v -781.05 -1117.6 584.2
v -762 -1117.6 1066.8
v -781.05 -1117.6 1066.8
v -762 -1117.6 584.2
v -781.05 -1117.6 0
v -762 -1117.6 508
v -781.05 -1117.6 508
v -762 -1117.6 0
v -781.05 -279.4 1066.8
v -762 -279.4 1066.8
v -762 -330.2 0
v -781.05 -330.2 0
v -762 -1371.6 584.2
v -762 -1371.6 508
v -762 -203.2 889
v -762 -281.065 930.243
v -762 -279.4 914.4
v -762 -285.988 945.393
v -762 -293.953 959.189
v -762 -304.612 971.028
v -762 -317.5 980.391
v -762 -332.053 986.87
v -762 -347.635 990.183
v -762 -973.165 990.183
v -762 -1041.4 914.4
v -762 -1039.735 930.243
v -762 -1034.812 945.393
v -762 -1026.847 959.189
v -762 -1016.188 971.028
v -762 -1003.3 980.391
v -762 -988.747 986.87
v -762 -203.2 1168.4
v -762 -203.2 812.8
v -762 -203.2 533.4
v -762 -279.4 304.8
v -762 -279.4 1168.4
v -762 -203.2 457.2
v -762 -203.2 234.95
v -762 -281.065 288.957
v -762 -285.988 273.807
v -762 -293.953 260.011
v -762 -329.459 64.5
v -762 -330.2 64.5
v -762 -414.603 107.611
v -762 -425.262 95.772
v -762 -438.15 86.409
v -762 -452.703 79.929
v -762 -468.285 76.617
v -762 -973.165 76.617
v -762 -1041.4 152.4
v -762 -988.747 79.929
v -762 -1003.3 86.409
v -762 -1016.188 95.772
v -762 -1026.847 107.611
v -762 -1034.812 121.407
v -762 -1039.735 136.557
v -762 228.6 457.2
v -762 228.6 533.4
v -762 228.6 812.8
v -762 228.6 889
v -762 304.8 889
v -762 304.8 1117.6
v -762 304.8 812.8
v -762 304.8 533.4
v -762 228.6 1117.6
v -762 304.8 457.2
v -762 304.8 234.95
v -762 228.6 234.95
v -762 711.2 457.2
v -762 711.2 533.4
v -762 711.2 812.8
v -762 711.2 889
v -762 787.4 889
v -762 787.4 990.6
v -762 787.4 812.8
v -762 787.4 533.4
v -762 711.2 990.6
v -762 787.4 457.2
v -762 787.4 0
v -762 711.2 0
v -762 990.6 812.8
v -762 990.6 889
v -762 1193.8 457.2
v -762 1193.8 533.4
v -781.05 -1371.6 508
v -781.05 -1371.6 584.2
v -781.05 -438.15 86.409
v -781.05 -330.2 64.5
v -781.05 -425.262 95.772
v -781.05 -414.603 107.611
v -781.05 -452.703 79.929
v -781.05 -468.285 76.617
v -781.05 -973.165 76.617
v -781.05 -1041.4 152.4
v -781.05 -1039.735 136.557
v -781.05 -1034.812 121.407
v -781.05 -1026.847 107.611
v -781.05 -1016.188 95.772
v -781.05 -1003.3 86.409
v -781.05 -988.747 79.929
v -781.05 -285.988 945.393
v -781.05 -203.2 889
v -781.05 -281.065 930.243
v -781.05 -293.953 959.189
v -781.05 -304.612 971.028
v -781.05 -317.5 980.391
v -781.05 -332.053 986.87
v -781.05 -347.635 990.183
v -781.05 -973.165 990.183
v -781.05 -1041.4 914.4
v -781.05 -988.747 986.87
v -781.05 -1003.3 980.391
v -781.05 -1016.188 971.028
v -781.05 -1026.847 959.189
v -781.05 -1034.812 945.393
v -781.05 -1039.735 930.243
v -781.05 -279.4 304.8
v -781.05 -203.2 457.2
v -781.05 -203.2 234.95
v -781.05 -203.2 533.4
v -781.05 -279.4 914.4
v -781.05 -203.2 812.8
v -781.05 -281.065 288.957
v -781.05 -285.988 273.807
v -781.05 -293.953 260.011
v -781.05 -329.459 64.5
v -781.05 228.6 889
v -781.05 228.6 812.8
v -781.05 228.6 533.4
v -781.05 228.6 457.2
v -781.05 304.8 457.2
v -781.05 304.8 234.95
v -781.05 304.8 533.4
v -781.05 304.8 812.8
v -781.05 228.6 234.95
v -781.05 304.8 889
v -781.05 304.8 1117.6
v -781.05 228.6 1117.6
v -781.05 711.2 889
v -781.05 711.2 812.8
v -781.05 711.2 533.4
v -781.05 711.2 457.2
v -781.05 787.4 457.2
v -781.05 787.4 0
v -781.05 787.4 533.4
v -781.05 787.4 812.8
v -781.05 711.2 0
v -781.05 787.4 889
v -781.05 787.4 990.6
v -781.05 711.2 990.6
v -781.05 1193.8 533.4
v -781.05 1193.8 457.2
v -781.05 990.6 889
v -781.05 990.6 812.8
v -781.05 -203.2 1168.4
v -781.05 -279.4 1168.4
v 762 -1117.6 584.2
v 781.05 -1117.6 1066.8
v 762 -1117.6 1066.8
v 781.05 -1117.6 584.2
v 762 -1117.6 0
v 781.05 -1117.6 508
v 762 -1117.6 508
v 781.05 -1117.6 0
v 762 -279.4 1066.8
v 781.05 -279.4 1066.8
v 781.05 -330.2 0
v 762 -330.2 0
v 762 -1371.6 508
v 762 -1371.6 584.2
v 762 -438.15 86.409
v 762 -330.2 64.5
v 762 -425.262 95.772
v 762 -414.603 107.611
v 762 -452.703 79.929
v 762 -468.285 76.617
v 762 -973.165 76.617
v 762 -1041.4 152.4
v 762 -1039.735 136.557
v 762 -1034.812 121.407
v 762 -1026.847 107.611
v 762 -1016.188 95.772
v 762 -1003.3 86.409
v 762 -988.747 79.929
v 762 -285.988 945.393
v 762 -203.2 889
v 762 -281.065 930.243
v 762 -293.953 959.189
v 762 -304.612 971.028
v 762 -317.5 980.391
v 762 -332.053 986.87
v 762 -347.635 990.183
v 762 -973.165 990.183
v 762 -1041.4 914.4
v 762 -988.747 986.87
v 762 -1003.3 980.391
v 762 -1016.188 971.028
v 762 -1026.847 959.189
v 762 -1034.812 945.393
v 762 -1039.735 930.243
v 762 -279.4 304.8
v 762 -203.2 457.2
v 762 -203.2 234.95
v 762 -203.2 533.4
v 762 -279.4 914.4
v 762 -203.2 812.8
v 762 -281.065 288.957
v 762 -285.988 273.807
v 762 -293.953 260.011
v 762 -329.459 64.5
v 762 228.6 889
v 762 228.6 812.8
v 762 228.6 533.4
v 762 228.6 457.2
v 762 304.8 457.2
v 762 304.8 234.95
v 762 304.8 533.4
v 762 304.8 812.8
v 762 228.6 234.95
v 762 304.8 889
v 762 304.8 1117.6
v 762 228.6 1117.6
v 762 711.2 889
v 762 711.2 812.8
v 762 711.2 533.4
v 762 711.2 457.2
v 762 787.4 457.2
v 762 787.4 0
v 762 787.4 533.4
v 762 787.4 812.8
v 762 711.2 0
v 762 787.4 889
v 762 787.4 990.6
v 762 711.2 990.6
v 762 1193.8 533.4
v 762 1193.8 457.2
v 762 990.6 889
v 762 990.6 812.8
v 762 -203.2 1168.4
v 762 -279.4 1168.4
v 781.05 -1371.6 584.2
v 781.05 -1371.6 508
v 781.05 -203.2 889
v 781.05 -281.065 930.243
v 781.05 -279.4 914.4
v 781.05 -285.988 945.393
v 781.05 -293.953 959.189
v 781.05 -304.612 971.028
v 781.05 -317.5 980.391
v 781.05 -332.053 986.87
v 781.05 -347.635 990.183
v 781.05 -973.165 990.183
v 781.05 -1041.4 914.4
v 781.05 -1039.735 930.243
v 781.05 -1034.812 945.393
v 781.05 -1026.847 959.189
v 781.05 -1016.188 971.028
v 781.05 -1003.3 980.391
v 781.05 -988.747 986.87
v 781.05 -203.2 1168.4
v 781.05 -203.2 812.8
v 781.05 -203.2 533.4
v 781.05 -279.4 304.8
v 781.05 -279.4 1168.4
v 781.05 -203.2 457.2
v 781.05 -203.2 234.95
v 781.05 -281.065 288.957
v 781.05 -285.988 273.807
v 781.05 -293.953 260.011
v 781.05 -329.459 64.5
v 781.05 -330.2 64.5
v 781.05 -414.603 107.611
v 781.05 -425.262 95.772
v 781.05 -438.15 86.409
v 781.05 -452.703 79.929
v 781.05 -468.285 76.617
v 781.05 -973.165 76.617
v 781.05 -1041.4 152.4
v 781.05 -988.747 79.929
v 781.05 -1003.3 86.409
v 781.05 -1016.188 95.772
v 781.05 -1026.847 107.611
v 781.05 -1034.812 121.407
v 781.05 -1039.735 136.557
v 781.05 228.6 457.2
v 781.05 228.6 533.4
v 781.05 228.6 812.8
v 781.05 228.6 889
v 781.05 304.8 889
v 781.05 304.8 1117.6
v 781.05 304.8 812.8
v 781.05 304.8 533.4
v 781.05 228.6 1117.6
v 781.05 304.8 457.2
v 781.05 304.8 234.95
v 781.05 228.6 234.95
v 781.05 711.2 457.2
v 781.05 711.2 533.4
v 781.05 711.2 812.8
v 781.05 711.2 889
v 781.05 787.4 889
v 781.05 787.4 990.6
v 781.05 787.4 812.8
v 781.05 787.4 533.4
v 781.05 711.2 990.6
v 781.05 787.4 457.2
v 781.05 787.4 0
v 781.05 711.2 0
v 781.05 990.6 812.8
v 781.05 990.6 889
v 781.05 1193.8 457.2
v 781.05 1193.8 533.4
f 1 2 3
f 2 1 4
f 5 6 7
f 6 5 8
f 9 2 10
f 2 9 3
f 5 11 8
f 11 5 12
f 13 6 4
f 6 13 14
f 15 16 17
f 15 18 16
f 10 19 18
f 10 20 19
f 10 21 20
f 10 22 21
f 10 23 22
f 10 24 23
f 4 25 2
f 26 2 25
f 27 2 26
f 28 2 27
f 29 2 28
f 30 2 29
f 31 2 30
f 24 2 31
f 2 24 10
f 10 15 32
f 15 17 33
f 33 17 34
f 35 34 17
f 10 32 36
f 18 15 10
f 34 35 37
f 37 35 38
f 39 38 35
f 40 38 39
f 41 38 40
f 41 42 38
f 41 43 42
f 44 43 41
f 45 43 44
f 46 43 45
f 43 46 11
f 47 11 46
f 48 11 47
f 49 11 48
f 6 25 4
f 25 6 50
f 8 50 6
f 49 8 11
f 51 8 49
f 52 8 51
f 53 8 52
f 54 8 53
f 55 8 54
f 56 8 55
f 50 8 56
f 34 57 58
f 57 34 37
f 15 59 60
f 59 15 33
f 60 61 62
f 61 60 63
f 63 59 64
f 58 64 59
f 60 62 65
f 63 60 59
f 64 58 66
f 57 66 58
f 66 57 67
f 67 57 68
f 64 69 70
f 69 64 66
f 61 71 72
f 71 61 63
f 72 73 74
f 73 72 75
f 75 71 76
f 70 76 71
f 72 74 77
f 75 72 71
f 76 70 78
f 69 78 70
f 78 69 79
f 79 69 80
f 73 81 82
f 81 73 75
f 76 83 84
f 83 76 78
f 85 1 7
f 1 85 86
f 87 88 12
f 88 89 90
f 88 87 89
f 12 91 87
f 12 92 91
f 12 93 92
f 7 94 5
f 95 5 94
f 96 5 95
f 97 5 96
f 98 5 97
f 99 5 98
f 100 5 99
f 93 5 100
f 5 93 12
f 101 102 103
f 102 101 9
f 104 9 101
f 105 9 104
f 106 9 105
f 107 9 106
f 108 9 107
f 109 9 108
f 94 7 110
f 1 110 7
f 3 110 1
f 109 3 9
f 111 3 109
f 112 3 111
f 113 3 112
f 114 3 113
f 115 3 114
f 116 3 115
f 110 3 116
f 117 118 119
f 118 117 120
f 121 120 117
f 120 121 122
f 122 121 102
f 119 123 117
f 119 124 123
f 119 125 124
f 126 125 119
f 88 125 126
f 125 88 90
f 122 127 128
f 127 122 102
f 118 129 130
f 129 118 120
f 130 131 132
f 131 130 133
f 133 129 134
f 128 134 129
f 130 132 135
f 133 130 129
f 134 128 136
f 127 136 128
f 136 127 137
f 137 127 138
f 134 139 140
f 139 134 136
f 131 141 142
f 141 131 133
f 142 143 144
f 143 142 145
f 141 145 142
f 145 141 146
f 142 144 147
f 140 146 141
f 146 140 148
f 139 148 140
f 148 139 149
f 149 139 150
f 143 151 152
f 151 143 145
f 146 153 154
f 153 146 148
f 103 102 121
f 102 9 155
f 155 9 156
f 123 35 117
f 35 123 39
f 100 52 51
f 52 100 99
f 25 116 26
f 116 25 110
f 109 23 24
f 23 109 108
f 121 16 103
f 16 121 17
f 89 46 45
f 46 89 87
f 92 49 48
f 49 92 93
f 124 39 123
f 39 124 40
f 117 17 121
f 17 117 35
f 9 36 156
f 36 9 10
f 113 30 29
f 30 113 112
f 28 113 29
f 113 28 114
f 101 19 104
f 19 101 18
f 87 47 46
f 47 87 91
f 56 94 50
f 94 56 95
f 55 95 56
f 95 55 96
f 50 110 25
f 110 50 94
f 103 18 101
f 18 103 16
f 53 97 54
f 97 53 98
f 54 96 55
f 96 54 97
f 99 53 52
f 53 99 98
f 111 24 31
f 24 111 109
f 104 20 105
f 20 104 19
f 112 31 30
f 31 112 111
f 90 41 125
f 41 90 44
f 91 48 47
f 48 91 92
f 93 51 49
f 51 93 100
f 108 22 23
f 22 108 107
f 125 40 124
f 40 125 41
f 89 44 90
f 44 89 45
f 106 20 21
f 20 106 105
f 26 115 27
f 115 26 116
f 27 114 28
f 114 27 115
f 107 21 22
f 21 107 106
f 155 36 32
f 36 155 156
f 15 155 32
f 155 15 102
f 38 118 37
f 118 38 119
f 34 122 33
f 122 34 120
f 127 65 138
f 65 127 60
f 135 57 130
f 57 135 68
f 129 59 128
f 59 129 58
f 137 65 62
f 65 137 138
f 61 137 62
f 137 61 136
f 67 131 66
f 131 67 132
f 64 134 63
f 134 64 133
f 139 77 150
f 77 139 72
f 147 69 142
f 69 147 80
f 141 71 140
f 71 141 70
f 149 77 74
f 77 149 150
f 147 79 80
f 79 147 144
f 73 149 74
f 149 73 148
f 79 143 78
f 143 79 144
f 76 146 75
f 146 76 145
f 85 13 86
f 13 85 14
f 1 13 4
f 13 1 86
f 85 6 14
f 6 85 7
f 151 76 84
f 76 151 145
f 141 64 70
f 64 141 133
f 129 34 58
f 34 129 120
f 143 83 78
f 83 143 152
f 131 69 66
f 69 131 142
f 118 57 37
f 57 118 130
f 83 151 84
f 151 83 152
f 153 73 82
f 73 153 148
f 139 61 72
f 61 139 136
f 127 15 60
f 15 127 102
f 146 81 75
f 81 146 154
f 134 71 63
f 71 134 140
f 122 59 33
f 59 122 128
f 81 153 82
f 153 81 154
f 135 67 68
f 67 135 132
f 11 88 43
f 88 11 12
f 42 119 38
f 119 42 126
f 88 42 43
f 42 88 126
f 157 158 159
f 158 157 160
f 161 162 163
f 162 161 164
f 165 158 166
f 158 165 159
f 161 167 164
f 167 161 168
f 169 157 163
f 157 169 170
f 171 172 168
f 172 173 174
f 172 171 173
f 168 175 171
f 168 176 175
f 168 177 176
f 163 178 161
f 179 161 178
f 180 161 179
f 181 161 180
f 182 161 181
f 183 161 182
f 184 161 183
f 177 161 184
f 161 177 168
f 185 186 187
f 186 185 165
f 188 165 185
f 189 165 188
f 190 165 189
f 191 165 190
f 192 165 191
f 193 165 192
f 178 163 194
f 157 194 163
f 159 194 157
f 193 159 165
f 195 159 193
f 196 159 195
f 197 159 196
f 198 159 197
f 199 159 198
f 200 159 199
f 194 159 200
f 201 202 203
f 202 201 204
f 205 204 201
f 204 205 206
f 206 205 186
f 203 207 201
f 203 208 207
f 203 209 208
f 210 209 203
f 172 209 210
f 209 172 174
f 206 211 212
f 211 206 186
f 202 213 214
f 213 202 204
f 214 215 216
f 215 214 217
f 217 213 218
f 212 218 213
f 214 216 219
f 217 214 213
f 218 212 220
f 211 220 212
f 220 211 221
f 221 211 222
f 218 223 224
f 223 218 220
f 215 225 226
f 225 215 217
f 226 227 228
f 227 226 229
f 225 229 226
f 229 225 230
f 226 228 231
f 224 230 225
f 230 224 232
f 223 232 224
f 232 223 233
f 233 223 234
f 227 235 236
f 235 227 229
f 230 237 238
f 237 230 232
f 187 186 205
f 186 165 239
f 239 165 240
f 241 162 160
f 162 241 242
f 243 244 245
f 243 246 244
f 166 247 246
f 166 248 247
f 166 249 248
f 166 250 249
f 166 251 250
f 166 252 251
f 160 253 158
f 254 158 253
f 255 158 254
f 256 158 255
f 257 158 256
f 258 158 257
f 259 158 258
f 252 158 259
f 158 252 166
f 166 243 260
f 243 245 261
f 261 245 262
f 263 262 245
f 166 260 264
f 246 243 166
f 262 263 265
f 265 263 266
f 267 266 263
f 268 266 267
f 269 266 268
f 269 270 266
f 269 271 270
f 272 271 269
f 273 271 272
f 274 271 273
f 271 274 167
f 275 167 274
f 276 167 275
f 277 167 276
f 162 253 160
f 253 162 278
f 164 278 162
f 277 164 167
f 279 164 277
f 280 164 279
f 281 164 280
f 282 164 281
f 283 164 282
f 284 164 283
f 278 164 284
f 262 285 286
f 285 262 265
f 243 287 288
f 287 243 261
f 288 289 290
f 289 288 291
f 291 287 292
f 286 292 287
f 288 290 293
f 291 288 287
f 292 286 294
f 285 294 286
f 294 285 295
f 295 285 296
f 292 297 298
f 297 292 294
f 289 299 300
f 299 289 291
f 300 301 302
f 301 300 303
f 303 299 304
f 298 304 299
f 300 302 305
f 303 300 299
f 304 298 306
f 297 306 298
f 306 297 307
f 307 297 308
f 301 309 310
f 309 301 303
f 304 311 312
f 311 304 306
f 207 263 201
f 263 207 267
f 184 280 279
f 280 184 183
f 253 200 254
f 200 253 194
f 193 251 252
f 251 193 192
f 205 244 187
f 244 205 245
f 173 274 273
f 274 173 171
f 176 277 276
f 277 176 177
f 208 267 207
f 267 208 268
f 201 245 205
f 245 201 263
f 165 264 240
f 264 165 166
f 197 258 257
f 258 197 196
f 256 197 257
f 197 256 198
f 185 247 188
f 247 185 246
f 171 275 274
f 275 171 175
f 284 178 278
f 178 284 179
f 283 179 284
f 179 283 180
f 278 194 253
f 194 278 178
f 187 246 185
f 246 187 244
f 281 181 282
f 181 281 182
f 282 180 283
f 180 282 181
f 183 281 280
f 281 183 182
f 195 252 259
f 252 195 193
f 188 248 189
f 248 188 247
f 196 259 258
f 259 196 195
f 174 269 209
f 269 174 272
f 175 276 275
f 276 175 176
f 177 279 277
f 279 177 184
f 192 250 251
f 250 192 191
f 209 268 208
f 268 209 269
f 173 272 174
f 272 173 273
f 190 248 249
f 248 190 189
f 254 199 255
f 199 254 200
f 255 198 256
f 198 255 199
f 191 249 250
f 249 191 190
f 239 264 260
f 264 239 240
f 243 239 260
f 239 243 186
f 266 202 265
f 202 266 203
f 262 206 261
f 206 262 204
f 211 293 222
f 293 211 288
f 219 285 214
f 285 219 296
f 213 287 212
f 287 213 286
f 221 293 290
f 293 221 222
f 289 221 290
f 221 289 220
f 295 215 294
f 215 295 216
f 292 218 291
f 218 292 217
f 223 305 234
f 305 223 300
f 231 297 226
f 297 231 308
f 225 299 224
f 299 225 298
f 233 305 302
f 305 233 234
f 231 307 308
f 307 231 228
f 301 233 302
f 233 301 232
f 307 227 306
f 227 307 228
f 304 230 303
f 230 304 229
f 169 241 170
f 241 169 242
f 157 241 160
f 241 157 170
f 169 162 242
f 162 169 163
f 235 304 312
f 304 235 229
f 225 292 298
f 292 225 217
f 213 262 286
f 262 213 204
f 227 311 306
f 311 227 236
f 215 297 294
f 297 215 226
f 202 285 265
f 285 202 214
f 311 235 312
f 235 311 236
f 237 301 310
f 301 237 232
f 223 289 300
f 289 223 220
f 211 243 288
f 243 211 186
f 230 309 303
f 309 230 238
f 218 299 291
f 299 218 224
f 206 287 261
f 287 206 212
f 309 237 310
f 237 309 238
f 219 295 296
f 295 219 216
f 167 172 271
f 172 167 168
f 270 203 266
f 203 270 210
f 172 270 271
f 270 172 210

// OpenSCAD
// file: ../constants/trailer.scad
use <../lib/convert.scad>

FRAME_WIDTH = feet(4);
FRAME_LENGTH = feet(8);
FRAME_THICKNESS = inches(3);
AXEL_OFFSET_Y = inches(6);
// file: ../components/wheel_well.scad
use <../lib/convert.scad>
use <../lib/colors.scad>

wheel_well_top_width = inches(22);
wheel_well_base_width = inches(32);
wheel_well_depth = inches(13);
wheel_well_base_thickness = inches(2.5);
wheel_well_height = inches(6) + wheel_well_base_thickness;


module wheel_well_cutout() {
  translate([0, 0, -1])
  translate([0, wheel_well_base_width / -2, 0])
  cube([wheel_well_depth + 1, wheel_well_base_width, wheel_well_base_thickness + 2]);
}

module wheel_well_shape() {
  color_wood()
  translate([0, wheel_well_base_width / -2, 0])
  hull() {
    translate([0, (wheel_well_base_width - wheel_well_top_width) / 2, wheel_well_height])
      cube([wheel_well_depth, wheel_well_top_width, inches(0.75)]);

    cube([wheel_well_depth, wheel_well_base_width, wheel_well_base_thickness]);
  }
}

module wheel_well_inside() {
  scale_y = (wheel_well_base_width - inches(1.5)) / wheel_well_base_width;
  scale_z = (wheel_well_height - inches(0.75)) / wheel_well_height;

  color_black()
  scale([1, scale_y, scale_z])
    wheel_well_shape();
}

module wheel_well() {
  difference() {
    wheel_well_shape();

    translate([inches(0.75), 0, -1])
      wheel_well_inside();
  }
}

wheel_well();
// file: ../lib/colors.scad
module color_wood() {
  color("#F8D89D")
    children();
}

module color_hdpe() {
  color("#ccd")
    children();
}

module color_steel() {
  color("#888")
    children();
}

module color_white() {
  color("#fafafa")
    children();
}

module color_black() {
  color("#333")
    children();
}

module color_outside() {
  color("#90b0c4")
    children();
}
// file: ../components/teardrop_side.scad
use <../lib/convert.scad>
use <../lib/colors.scad>
use <./wheel_well.scad>
use <./teardrop_ceiling.scad>
include <../constants/trailer.scad>

side_skin_thickness = inches(0.25);
side_frame_thickness = inches(0.75);

wheel_well_x_offset = AXEL_OFFSET_Y + feet(4) + inches(0);

door_width = inches(30);
door_height = inches(36);
door_radius = inches(3);
door_offset = inches(10);

// Fixes for dxf import
bottom_offset = inches(-0.67);
front_offset = feet(-8) + inches(-11.07);
scale_fix = 1.002;

module door_cutout() {
  thickness = inches(3);
  radius_offset = door_radius * 2;

  translate([door_radius, door_radius, -thickness / 2])
  hull() {
    // bottom left, this creates a angled corner to fit the wheelwell
    translate([0, inches(6), 0])
      cylinder(thickness, r1 = door_radius, r2 = door_radius);
    translate([inches(4.75), 0, 0])
      cylinder(thickness, r1 = door_radius, r2 = door_radius);

    // bottom right
    translate([door_width - radius_offset, 0, 0])
      cylinder(thickness, r1 = door_radius, r2 = door_radius);

    // top left
    translate([0, door_height -  radius_offset, 0])
      cylinder(thickness, r1 = door_radius, r2 = door_radius);

    // top right
    translate([door_width -  radius_offset, door_height -  radius_offset, 0])
      cylinder(thickness, r1 = door_radius, r2 = door_radius);
  }
}

module side_extrusion(thickness) {
  translate([front_offset, 0, bottom_offset])
  rotate([90, 0, 0])
  linear_extrude(height = thickness)
  scale([scale_fix, scale_fix])
      import("../../drawings/sidewall.dxf");
}

module outside_side_skin() {
  color_outside()
  difference() {
    side_extrusion(side_skin_thickness);

    // door cut out
    translate([-door_width - door_offset, 0, inches(3)])
    rotate([90, 0, 0])
      door_cutout();

    translate([-wheel_well_x_offset, inches(-3), 0])
    rotate([0, 0, 90])
      wheel_well_shape();

    translate([-wheel_well_x_offset, inches(-3), 0])
    rotate([0, 0, 90])
      wheel_well_cutout();
  }
}

module inside_side_skin() {
  color_wood()
  difference() {
    outside_side_skin();

    // inside 1/4" ply doesnt extend all the way down
    translate([feet(-9), inches(-0.5), inches(-0.5)])
      cube([feet(10), inches(0.75), inches(3)]);

    // Cut out the ceiling
    translate([10, 1, -1])
    scale([1.01, 1, 1.01])
    teardrop_ceiling_half();
  }
}

module side_frame() {
  color_wood()
  difference() {
    union() {
      // outer frame
      difference() {
        side_extrusion(side_frame_thickness);

        translate([inches(-3), inches(0.25), inches(3)])
          scale([0.93, 1, 0.88])
          side_extrusion(side_frame_thickness * 2);

      }

      // door frame
      difference() {
        translate([inches(-32) - door_offset, inches(-0.75), 0])
          cube([inches(35), inches(0.75), inches(42)]);

        translate([-door_width - door_offset, 0, inches(3)])
        rotate([90, 0, 0])
          door_cutout();
      }

      // door virt
      translate([-door_width - door_offset - inches(3), inches(-0.75), 0])
        cube([inches(3), inches(0.75), inches(46)]);

      // first virt
      translate([feet(-5.25), inches(-0.75), 0])
        cube([inches(3), inches(0.75), inches(44)]);

      // second virt
      translate([feet(-6) + inches(-10), inches(-0.75), 0])
        cube([inches(3), inches(0.75), inches(39)]);

      // front horz
      translate([-door_offset + inches(3), inches(-0.75), inches(20)])
        cube([door_offset, inches(0.75), inches(3)]);

      // back lower
      translate([feet(-8) + inches(-2), inches(-0.75), inches(18)])
        cube([feet(4.75), inches(0.75), inches(3)]);

      // back upper
      translate([feet(-7.5), inches(-0.75), inches(32)])
        cube([feet(4), inches(0.75), inches(3)]);
    }

    translate([-wheel_well_x_offset, inches(-3), 0])
    rotate([0, 0, 90])
      wheel_well_shape();

    translate([-wheel_well_x_offset, inches(-3), 0])
    rotate([0, 0, 90])
      wheel_well_cutout();
  }
}


module teardrop_side() {
  union() {
    translate([0, -(side_skin_thickness + side_frame_thickness), 0])
      outside_side_skin();

    translate([0, -side_skin_thickness, 0])
      side_frame();

    inside_side_skin();
  }
}

teardrop_side();
// file: ../components/teardrop_ceiling.scad
use <../lib/convert.scad>

/**
 * TODO:
 * - Make lip over walls
 * - Cutout for stargazer window
 * - Cutout for fan
 * - Make galley door
 */

ceiling_width = feet(5);
ceiling_thickness = inches(1.75);

// Fixes for dxf import
bottom_offset = inches(-0.67);
front_offset = feet(-8) + inches(-11.07);
scale_fix = 1.002;

module teardrop_ceiling_half() {
  cutout_scale = (feet(4) - ceiling_thickness) / feet(4);
  difference() {
    // side shape from dxf
    translate([front_offset, 0, bottom_offset])
    rotate([90, 0, 0])
    linear_extrude(height = ceiling_width / 2)
    scale([scale_fix, scale_fix])
        import("../../drawings/sidewall.dxf");

    // cut out inside
    translate([-ceiling_thickness, 1, -1])
    scale([cutout_scale, 1.1, cutout_scale])
    translate([front_offset, 0, bottom_offset])
    rotate([90, 0, 0])
    linear_extrude(height = ceiling_width / 2)
    scale([scale_fix, scale_fix])
        import("../../drawings/sidewall.dxf");
  }
}

module teardrop_ceiling_galley_cutout() {
  translate([feet(-8) + inches(-12), -(ceiling_width / 2) - 1, inches(-3)])
    cube([inches(30), ceiling_width + 2, feet(4)]);
}

module teardrop_ceiling() {
  difference() {
    union() {
      mirror([0, 1, 0])
        teardrop_ceiling_half();
      teardrop_ceiling_half();
    }

    // cut out galley
    teardrop_ceiling_galley_cutout();
  }
}

teardrop_ceiling();
// file: ../lib/convert.scad
function inches(in) = in * 25.4;
function feet(ft) = inches(ft * 12);
// main file
use <../lib/convert.scad>
use <../components/teardrop_ceiling.scad>
use <../components/teardrop_side.scad>

module passenger_side() {
  translate([feet(-2.5) + inches(0.25), inches(-51), 0])
  rotate([0, 0, -90])
    teardrop_side();
}

module driver_side() {
  mirror([1, 0, 0])
    passenger_side();
}

module shell(show_ceiling = true, show_sides = true) {
  if (show_sides) {
    passenger_side();
    driver_side();
  }

  if (show_ceiling) {
    translate([0, feet(-3) + inches(-15), 0])
    rotate([0, 0, -90])
      teardrop_ceiling();
  }
}

shell();
